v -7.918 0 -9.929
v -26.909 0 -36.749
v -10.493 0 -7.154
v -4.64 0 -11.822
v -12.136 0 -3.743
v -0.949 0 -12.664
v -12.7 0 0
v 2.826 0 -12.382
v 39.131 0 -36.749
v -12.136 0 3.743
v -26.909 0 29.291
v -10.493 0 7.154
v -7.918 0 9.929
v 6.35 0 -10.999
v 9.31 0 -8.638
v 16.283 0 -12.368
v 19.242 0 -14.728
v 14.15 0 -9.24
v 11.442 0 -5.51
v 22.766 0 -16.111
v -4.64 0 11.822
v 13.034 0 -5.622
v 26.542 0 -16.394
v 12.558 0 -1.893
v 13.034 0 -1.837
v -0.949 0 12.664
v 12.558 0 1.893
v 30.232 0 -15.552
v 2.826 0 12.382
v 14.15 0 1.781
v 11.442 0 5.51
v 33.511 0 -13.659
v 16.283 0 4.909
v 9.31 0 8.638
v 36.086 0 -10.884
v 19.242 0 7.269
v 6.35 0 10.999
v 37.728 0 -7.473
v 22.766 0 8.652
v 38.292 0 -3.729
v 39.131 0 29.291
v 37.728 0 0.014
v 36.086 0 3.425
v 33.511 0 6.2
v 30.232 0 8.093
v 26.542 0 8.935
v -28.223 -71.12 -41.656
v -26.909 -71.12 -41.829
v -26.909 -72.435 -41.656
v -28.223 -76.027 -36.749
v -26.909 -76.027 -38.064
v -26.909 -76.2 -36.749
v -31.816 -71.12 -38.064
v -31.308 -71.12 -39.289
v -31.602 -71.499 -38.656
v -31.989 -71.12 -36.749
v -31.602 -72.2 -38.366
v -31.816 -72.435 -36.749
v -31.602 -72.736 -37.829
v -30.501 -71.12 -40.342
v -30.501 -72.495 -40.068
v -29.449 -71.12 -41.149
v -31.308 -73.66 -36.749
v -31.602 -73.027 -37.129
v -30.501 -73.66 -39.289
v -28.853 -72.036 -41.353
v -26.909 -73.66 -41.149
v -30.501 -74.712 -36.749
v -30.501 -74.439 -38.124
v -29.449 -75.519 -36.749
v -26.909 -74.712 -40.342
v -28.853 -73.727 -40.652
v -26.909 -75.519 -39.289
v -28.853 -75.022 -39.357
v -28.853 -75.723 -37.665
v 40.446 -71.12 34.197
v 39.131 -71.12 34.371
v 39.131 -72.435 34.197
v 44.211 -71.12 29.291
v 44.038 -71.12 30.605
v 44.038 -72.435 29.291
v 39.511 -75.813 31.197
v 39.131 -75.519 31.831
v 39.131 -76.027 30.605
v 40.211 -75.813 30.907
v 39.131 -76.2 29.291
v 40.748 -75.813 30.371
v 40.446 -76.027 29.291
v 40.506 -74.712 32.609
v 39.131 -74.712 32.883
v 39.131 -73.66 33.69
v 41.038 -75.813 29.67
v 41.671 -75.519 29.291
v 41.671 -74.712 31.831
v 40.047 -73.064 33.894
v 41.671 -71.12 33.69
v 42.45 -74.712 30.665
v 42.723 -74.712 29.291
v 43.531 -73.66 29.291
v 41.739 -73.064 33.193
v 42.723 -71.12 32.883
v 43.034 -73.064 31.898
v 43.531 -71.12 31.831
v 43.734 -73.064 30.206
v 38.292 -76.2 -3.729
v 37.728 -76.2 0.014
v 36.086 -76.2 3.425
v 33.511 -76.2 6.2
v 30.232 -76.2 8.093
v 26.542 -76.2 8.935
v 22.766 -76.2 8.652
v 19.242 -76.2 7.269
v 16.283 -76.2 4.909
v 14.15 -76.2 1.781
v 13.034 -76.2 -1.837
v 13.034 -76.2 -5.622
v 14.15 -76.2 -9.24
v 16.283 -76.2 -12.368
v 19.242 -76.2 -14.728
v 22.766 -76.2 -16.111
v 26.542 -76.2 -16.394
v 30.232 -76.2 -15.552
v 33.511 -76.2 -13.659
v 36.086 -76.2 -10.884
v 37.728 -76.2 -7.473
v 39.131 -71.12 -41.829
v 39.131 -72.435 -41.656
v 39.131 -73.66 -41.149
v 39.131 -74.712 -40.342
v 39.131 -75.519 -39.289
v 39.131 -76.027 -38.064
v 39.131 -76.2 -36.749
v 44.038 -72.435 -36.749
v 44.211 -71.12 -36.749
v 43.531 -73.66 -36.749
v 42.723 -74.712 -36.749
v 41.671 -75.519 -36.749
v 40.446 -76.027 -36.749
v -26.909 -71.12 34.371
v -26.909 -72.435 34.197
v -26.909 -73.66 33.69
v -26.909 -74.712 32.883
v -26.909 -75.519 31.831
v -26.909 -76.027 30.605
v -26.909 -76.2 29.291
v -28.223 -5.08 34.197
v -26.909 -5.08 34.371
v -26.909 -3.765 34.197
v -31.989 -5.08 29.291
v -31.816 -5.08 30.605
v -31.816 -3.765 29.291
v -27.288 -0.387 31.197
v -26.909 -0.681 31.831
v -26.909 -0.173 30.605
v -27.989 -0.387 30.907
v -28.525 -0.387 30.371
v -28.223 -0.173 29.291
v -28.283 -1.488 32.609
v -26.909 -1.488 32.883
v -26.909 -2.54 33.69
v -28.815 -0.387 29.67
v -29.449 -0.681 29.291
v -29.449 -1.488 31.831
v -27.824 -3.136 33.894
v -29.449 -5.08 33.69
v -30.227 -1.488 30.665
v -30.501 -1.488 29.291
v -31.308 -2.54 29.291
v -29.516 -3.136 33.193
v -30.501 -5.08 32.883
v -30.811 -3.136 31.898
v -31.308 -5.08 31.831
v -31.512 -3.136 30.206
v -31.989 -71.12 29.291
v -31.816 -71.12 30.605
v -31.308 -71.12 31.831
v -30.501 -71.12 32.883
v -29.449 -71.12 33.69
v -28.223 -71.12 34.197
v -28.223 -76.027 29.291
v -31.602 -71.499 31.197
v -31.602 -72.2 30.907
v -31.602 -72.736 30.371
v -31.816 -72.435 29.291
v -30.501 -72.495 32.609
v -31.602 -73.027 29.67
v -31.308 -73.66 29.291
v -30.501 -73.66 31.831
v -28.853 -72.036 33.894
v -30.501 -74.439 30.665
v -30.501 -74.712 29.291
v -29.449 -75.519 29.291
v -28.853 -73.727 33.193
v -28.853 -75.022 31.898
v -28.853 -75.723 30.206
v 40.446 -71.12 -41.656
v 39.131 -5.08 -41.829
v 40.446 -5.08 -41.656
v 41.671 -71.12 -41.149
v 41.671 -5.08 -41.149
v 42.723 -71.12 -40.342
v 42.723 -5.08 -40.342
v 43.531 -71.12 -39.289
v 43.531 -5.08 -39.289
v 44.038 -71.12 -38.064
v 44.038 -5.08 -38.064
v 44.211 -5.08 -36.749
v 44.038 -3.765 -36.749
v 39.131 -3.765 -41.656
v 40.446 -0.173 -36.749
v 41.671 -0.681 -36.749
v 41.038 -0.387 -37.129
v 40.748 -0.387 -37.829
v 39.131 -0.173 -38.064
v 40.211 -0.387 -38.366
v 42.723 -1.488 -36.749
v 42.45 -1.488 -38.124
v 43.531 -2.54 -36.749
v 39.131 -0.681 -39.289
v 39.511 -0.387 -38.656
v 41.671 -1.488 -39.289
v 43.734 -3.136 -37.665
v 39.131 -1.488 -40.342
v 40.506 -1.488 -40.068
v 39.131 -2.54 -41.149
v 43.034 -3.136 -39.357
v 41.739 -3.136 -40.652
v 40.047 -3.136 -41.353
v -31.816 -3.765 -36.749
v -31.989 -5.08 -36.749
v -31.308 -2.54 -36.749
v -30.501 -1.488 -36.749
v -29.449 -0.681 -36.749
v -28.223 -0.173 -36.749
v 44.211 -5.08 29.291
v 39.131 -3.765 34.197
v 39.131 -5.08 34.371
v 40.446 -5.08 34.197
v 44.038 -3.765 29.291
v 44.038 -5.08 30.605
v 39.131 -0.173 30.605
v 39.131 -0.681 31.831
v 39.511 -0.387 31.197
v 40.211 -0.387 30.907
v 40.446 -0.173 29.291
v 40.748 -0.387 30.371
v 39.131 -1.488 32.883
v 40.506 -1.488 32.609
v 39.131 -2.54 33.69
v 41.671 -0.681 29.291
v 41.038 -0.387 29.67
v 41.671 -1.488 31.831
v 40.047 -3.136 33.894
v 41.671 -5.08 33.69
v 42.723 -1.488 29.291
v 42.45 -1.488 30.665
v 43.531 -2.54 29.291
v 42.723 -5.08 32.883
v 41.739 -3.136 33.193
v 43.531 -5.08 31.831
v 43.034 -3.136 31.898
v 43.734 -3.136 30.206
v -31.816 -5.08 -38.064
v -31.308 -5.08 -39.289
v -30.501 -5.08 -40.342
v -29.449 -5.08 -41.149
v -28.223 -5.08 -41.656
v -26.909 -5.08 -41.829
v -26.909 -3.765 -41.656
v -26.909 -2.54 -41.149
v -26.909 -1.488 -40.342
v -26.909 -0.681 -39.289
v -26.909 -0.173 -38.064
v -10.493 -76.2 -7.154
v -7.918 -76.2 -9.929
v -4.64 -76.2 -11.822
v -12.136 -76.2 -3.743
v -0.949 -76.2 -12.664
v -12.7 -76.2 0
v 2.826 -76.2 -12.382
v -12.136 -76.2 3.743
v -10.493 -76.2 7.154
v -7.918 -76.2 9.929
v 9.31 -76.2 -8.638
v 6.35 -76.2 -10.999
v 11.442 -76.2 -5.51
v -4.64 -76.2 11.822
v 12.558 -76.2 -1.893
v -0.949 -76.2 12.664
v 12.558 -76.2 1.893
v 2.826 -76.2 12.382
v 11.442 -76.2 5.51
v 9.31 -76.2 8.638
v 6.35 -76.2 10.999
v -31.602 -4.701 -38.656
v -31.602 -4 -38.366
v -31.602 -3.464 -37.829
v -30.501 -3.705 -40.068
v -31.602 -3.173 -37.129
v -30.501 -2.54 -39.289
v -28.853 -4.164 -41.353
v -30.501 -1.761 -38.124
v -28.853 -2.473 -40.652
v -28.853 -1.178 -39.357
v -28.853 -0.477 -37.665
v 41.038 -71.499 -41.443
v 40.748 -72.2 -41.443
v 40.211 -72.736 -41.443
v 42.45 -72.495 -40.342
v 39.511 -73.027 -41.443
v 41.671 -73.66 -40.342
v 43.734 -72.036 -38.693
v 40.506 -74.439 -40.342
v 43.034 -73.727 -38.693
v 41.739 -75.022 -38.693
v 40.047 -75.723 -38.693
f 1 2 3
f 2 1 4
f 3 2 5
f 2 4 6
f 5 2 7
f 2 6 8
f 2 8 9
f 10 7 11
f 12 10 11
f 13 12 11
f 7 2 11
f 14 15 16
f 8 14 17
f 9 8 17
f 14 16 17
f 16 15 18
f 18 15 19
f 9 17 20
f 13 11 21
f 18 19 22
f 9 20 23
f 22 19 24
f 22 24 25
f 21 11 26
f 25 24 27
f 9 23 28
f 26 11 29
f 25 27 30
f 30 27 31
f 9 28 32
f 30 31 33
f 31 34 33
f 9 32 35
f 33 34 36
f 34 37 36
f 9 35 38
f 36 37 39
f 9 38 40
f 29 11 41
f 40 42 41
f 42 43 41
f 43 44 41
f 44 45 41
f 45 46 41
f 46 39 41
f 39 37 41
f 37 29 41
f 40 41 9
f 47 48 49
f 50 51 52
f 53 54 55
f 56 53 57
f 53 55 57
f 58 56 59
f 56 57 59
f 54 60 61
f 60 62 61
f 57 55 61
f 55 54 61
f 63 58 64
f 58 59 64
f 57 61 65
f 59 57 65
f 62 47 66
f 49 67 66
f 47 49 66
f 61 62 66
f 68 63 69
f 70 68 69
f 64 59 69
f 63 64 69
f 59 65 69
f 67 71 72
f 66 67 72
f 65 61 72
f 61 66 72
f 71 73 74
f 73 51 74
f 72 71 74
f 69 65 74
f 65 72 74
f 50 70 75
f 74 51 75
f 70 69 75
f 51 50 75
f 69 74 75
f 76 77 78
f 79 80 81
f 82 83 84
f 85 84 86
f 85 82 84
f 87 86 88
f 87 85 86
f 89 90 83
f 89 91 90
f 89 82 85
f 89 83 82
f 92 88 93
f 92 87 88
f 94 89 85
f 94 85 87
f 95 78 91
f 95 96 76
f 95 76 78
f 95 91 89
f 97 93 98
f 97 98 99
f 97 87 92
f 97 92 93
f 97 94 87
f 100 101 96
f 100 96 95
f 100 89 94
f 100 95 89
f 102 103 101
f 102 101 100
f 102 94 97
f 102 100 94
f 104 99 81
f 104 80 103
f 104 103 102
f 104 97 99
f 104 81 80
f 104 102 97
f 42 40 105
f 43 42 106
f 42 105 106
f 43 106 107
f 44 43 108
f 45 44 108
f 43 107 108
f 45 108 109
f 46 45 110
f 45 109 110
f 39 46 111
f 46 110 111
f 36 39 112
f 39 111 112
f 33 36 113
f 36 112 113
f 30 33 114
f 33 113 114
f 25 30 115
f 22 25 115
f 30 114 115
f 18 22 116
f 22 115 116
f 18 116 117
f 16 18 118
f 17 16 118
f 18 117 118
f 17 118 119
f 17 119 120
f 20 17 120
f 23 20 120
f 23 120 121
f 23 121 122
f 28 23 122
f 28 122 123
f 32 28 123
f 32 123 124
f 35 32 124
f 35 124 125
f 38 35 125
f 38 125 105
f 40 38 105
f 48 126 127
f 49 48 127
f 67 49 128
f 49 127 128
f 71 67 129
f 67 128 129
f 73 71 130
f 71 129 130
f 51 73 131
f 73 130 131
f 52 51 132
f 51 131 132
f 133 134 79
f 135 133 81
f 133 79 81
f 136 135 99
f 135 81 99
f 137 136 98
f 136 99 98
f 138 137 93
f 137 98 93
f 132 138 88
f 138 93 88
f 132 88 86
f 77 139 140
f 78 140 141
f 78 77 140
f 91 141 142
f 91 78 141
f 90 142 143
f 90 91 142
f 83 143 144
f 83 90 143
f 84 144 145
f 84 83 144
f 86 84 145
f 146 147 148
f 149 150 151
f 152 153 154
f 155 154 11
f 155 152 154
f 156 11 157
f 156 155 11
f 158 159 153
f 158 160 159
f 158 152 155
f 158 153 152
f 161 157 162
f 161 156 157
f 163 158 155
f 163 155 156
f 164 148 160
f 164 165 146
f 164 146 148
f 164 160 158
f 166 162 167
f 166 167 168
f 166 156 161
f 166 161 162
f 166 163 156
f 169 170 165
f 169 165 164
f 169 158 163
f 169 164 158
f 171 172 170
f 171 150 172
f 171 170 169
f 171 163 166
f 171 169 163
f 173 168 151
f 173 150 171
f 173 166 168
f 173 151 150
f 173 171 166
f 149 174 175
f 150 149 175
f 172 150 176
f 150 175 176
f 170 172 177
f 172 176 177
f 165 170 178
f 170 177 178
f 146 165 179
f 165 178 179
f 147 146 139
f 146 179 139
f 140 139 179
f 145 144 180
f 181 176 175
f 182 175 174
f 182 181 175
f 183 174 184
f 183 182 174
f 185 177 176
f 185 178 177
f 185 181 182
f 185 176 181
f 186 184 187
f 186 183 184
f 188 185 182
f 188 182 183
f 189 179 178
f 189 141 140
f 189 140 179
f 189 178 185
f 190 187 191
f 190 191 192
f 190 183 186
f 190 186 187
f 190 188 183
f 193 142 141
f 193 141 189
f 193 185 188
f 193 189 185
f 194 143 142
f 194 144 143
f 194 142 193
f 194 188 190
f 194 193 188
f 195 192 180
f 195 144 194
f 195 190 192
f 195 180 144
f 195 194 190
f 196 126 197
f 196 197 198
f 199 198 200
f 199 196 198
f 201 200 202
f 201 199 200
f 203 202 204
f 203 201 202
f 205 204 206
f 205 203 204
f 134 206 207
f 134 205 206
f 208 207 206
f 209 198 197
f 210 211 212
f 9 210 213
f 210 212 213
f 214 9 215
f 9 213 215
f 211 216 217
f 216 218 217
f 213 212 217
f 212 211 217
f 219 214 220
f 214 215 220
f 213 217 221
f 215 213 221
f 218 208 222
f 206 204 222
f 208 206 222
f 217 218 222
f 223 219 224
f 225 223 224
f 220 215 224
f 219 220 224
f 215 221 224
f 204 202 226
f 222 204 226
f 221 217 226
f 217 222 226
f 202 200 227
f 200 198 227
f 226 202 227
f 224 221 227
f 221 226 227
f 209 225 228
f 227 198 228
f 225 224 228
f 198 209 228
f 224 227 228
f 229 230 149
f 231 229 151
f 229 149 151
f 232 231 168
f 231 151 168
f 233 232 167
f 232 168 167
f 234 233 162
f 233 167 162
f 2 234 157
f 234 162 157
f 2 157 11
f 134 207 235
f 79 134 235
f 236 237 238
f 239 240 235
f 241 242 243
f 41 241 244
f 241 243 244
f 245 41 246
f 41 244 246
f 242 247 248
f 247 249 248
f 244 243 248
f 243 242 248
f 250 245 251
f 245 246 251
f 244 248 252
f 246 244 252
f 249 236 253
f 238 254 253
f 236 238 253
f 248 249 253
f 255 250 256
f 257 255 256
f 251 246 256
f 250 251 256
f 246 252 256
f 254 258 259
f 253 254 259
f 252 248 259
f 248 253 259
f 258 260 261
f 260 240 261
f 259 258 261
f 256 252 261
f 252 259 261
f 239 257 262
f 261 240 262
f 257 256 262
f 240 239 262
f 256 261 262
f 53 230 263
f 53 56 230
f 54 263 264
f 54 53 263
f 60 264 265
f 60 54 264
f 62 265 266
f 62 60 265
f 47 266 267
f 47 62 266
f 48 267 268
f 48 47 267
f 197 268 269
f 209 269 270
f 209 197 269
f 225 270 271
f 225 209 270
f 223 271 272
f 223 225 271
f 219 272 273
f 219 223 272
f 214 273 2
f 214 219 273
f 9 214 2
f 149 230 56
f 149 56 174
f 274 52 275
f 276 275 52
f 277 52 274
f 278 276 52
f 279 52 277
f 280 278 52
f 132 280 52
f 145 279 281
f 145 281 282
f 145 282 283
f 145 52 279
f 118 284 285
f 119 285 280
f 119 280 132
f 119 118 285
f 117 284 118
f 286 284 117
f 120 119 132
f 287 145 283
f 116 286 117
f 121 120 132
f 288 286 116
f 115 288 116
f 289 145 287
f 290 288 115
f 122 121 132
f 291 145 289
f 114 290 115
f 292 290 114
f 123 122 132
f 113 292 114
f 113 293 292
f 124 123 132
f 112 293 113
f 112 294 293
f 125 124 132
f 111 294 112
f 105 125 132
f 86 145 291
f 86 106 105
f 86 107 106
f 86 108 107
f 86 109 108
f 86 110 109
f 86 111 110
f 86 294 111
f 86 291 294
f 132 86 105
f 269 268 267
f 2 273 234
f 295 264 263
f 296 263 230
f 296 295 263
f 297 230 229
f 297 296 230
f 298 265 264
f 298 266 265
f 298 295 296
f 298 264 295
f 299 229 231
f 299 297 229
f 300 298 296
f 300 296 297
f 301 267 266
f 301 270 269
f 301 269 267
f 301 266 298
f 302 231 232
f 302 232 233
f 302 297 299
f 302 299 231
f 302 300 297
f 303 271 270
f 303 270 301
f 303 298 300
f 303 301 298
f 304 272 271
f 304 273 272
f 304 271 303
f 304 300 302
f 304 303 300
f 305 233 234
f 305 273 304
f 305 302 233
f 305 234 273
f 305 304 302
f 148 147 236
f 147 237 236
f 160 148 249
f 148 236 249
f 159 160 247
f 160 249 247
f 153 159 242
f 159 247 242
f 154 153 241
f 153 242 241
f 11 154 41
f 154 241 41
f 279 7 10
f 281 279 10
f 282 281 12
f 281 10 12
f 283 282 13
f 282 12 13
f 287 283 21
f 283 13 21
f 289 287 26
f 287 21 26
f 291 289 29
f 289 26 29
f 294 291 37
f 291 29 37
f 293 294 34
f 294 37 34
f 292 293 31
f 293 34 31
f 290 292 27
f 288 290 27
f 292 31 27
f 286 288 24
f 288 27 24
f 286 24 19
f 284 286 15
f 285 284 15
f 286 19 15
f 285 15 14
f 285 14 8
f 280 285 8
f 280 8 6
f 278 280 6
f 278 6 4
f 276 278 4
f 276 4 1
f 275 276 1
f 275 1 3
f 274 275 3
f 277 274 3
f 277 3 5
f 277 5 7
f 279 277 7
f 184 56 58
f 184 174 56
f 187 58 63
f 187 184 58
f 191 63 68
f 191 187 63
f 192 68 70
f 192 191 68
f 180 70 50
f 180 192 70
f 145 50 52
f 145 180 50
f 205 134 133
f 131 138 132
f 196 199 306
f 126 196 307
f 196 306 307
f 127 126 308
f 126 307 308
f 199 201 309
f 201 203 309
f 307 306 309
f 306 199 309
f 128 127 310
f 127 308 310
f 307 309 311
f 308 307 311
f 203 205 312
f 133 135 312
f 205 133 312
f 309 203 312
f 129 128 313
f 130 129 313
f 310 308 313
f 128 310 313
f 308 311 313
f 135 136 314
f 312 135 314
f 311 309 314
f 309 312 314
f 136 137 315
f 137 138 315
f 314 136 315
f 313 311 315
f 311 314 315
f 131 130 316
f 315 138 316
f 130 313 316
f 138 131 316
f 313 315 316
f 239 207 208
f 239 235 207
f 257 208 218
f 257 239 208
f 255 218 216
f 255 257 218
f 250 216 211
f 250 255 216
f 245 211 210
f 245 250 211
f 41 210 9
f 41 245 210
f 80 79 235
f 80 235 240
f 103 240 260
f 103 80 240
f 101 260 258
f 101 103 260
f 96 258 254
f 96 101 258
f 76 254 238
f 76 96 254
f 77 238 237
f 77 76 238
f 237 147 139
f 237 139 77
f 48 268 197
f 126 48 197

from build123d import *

# Parameters (mm, degrees)
F0_W     = 76.2
F0_H     = 76.2
F1_DEPTH = 76.2
F2_R     = 5.08
F4_D     = 25.4
F6_D     = 25.4


with BuildPart() as f1:
    # F0 (on Front) → F1 (new body)
    with BuildSketch(Plane.XZ):
        with Locations((6.111342, -3.729404)):
            Rectangle(F0_W, F0_H)
    extrude(amount=F1_DEPTH)

    # F2
    f2_edges = [f1.edges().sort_by_distance(p)[0] for p in [
        (44.211342, -38.1, 34.370596),
        (6.111342, -76.2, 34.370596),
        (44.211342, -76.2, -3.729404),
        (44.211342, -38.1, -41.829404),
        (6.111342, -76.2, -41.829404),
        (-31.988658, -38.1, 34.370596),
        (6.111342, 0, 34.370596),
        (44.211342, 0, -3.729404),
        (6.111342, 0, -41.829404),
        (-31.988658, -38.1, -41.829404),
        (-31.988658, 0, -3.729404),
        (-31.988658, -76.2, -3.729404),
    ]]
    fillet(f2_edges, radius=F2_R)

    # F4 (through all)
    with Locations(Plane.XZ.offset(76.2)):
        with Locations((0, 0)):
            Hole(F4_D / 2)

    # F6 (through all)
    with Locations(Plane(origin=(0, 0, 0), x_dir=(-1, 0, 0), z_dir=(0, 1, 0))):
        with Locations((-25.59245, -3.729404)):
            Hole(F6_D / 2)


solid = f1.part
